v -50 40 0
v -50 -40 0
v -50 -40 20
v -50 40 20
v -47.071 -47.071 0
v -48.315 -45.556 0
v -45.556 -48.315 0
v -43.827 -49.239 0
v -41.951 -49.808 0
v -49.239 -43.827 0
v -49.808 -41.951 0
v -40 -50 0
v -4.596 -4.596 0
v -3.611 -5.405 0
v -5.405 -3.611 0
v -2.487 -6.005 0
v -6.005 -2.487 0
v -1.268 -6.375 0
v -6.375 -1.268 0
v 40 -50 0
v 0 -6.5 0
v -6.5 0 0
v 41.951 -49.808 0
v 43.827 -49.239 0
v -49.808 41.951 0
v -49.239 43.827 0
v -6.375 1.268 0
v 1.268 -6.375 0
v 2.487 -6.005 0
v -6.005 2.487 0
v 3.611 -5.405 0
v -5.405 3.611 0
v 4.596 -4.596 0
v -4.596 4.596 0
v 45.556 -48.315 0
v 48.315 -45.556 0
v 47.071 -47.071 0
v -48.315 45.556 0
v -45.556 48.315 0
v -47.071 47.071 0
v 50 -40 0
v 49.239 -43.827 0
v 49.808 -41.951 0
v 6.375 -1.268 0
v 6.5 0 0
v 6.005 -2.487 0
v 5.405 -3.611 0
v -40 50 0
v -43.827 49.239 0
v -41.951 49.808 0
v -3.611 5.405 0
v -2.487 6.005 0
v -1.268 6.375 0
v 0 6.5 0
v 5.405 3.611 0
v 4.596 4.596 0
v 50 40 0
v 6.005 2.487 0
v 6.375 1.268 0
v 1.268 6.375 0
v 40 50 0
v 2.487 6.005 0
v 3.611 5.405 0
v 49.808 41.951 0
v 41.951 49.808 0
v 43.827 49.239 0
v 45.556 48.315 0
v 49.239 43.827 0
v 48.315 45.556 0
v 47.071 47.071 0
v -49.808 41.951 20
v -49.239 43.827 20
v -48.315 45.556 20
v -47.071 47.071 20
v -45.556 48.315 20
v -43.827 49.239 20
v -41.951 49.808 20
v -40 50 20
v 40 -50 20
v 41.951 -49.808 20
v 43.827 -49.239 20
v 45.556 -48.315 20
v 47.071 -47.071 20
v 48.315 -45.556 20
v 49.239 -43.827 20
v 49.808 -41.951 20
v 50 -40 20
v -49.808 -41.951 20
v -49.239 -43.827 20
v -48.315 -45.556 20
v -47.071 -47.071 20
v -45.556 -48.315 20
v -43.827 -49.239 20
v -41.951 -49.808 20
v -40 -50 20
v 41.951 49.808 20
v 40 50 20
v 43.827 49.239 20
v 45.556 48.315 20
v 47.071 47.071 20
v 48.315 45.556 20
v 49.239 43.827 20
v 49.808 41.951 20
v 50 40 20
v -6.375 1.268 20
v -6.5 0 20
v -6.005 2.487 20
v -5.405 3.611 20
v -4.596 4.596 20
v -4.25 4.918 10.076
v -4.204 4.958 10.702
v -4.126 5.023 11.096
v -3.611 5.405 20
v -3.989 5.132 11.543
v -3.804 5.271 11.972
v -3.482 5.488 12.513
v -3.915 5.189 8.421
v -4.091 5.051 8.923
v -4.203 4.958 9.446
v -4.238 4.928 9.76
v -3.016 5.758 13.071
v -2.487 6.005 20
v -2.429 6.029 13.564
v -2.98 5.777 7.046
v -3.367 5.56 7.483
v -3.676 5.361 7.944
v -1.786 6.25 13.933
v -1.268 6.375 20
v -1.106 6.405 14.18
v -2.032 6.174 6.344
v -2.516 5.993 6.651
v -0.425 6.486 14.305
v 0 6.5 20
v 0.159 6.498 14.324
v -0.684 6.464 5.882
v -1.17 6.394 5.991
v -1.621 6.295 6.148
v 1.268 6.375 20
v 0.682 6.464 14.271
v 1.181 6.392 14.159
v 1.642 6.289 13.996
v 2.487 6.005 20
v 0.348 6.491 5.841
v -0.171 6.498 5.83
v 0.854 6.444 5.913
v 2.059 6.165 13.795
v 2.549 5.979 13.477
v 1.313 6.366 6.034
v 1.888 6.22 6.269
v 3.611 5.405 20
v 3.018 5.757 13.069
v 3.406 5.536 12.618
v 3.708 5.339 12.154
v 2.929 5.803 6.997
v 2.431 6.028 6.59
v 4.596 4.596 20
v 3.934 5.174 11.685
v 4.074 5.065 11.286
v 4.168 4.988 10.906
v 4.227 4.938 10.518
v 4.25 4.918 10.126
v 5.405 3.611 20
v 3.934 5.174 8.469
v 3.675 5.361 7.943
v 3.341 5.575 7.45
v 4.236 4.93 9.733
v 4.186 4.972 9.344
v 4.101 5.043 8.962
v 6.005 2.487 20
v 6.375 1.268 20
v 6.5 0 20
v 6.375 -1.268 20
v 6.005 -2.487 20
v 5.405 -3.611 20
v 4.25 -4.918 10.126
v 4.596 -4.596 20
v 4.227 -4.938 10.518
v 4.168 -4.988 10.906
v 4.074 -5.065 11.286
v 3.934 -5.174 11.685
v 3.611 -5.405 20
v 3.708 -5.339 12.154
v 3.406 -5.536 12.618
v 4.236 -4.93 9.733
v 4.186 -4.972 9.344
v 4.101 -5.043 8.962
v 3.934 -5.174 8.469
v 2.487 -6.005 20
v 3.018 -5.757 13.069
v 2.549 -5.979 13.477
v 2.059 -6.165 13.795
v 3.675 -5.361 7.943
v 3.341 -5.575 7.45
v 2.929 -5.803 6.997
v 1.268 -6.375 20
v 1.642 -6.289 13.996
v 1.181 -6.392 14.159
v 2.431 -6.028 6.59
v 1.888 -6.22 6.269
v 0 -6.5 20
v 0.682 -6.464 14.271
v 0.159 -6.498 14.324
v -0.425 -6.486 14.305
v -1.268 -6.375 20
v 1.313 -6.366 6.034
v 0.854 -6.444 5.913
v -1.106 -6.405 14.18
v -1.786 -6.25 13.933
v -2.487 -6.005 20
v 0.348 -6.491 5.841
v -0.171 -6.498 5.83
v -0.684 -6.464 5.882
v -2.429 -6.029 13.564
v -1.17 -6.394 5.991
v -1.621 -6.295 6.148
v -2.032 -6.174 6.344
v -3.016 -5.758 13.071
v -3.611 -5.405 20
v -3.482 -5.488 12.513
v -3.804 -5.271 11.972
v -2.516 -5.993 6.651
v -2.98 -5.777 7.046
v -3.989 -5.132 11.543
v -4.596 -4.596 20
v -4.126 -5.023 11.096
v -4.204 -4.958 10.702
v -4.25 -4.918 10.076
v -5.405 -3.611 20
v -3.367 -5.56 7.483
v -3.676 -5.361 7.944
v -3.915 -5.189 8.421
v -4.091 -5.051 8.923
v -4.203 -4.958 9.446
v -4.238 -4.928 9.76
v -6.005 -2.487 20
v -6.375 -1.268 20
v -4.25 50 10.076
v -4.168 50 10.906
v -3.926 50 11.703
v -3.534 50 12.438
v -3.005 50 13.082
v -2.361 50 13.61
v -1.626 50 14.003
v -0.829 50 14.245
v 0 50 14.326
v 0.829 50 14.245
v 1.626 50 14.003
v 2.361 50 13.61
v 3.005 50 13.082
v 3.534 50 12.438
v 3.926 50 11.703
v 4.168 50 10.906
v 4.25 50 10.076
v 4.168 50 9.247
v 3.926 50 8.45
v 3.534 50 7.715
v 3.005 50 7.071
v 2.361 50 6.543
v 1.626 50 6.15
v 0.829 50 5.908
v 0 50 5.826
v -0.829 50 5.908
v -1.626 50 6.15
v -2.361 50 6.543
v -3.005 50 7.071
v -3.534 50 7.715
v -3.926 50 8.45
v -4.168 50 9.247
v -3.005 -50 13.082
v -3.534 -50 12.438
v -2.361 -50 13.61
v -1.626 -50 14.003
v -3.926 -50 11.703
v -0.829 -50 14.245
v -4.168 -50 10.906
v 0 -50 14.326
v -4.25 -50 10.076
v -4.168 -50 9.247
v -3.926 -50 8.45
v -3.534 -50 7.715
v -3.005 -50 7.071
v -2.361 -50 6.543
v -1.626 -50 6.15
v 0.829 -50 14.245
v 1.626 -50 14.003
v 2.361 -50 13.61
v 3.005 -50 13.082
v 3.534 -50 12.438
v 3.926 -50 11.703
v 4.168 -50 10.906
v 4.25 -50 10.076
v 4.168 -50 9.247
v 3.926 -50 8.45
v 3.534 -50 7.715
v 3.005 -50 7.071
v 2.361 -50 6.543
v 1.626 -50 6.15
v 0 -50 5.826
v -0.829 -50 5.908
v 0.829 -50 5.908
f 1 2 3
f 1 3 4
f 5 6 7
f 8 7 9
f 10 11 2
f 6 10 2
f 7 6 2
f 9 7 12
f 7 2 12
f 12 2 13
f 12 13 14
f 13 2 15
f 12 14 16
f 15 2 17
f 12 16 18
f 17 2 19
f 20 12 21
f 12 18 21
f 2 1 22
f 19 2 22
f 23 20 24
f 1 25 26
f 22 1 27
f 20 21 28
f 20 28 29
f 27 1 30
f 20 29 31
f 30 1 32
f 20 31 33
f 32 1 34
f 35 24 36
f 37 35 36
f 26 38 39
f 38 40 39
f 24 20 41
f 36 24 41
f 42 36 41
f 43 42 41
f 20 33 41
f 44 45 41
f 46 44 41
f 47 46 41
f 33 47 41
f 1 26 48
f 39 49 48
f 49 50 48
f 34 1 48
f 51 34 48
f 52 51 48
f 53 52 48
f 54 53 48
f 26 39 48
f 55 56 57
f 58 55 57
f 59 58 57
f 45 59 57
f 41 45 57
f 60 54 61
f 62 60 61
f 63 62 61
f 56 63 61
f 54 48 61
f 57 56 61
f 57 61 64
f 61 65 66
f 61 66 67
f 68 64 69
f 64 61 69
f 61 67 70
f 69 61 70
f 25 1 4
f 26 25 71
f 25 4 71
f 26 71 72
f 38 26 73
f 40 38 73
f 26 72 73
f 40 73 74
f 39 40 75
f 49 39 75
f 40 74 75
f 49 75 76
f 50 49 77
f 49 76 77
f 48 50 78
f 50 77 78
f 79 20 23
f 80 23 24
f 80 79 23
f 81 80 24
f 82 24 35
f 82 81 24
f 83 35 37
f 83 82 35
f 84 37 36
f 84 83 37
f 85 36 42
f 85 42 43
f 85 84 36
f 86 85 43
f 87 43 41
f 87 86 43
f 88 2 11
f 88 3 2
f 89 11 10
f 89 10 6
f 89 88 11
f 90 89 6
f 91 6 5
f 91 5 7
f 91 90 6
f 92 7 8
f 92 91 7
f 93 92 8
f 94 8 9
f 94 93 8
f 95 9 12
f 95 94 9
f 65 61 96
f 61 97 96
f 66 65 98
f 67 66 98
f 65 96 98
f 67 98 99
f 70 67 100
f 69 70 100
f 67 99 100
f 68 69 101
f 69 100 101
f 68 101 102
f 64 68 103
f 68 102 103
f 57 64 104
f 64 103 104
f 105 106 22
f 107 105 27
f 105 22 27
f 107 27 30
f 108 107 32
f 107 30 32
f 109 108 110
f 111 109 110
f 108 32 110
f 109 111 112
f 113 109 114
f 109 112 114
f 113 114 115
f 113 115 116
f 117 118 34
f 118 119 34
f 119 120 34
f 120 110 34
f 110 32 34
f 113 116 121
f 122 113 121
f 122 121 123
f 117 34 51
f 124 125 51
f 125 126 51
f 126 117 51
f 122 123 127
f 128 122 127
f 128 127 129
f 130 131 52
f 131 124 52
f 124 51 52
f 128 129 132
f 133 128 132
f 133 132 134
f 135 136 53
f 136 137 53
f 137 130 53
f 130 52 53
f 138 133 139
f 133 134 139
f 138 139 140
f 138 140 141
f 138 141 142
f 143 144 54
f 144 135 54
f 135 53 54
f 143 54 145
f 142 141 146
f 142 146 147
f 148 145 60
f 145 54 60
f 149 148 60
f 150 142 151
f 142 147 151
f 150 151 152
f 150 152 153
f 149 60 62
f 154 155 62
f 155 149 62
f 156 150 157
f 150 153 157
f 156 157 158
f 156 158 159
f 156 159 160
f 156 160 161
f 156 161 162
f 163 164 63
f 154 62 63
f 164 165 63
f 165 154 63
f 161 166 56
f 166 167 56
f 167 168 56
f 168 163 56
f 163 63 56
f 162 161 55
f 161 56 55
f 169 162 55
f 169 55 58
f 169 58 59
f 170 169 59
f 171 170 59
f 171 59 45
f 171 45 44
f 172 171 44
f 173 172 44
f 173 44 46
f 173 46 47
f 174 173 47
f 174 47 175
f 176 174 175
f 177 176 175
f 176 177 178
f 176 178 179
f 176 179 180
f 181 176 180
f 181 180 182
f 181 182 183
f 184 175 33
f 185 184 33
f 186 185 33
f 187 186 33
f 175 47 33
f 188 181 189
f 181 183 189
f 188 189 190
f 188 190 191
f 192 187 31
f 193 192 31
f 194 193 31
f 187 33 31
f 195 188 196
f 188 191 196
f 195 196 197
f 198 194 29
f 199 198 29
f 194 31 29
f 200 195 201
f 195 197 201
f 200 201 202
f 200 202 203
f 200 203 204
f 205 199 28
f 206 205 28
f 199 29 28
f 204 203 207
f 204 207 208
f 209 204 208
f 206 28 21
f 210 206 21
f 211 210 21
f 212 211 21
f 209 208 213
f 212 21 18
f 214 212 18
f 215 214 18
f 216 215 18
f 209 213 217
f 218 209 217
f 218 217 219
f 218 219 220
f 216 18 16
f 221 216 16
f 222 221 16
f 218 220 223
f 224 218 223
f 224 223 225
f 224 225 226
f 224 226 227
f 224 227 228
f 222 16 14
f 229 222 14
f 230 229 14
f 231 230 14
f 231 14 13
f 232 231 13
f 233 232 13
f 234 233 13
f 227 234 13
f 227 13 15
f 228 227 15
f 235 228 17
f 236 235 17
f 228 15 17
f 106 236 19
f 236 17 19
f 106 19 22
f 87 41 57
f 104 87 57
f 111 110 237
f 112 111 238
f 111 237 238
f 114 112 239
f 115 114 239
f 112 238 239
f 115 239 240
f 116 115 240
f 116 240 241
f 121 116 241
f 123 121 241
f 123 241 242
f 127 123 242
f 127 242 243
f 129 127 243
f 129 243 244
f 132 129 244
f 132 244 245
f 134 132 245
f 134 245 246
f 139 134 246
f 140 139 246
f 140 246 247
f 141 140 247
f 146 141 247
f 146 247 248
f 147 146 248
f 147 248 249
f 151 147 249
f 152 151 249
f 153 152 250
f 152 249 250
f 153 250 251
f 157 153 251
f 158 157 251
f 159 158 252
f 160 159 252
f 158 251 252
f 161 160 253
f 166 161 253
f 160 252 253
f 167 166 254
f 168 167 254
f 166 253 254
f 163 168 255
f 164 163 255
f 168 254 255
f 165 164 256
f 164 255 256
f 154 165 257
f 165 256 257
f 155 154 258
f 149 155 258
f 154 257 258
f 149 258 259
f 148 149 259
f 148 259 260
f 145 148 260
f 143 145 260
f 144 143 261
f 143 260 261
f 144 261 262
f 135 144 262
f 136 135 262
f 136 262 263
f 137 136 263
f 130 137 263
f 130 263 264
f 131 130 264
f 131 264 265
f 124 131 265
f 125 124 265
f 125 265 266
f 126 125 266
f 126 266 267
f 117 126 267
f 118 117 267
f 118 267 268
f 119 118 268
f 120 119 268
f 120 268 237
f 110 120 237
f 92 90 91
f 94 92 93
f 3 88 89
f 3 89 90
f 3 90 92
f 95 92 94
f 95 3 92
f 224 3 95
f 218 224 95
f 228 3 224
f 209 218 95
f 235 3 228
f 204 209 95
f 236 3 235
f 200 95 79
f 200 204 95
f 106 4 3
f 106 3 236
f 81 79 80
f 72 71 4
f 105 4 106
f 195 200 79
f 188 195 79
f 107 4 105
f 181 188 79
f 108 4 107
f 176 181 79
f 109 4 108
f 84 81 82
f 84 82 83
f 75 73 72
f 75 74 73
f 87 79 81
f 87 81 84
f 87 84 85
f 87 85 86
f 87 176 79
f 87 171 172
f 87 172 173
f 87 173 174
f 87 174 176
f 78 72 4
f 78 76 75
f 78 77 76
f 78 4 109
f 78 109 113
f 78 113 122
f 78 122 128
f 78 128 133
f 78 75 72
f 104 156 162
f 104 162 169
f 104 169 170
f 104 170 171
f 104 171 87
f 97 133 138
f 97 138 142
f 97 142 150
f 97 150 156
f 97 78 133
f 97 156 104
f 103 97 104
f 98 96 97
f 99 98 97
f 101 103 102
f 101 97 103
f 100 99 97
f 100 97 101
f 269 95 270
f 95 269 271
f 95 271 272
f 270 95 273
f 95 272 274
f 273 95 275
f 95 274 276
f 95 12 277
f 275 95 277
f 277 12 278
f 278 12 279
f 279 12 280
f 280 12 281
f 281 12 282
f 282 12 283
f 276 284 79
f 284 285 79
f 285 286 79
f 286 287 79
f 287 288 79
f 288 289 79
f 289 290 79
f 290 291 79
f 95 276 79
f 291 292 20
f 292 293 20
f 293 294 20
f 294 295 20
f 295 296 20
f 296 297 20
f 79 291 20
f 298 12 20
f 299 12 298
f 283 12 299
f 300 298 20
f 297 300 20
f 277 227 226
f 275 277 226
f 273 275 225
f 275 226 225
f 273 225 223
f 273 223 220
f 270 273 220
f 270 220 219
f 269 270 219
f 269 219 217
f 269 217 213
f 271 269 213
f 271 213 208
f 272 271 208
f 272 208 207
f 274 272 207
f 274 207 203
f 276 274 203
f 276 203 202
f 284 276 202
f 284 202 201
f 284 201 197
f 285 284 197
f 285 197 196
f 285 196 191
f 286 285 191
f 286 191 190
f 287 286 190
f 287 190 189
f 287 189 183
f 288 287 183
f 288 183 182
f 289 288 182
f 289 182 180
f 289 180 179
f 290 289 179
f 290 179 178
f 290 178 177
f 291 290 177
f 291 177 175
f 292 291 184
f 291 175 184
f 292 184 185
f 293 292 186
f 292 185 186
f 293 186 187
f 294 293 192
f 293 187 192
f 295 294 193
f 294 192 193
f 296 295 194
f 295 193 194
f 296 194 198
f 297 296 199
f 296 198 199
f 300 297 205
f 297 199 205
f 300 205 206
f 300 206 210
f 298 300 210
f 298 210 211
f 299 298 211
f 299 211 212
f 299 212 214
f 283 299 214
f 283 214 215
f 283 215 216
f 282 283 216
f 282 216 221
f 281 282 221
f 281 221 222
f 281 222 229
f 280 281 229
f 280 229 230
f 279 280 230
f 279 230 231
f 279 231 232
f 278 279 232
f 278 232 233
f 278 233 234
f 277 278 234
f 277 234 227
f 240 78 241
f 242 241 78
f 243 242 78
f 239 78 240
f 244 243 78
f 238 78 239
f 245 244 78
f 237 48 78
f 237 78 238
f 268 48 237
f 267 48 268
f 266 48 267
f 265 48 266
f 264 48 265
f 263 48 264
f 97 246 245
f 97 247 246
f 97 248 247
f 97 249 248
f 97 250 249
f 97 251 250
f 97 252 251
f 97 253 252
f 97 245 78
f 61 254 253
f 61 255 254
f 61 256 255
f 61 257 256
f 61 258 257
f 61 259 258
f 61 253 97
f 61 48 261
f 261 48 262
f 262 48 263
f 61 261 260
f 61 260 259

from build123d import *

# Parameters (mm, degrees)
F0_W     = 100
F0_H     = 100
F1_DEPTH = 20
F3_D     = 8.5
F5_D     = 13
F6_R     = 10


with BuildPart() as f1:
    # F0 (on Top) → F1 (new body)
    with BuildSketch(Plane.XY):
        Rectangle(F0_W, F0_H)
    extrude(amount=F1_DEPTH)

    # F3 (through all)
    with Locations(Plane.XZ.offset(50)):
        with Locations((0, 10.0764958188)):
            Hole(F3_D / 2)

    # F5 (through all)
    with Locations(Plane.XY.offset(20)):
        with Locations((0, 0)):
            Hole(F5_D / 2)

    # F6
    f6_edges = [f1.edges().sort_by_distance(p)[0] for p in [
        (50, -50, 10),
        (-50, -50, 10),
        (50, 50, 10),
        (-50, 50, 10),
    ]]
    fillet(f6_edges, radius=F6_R)


solid = f1.part
